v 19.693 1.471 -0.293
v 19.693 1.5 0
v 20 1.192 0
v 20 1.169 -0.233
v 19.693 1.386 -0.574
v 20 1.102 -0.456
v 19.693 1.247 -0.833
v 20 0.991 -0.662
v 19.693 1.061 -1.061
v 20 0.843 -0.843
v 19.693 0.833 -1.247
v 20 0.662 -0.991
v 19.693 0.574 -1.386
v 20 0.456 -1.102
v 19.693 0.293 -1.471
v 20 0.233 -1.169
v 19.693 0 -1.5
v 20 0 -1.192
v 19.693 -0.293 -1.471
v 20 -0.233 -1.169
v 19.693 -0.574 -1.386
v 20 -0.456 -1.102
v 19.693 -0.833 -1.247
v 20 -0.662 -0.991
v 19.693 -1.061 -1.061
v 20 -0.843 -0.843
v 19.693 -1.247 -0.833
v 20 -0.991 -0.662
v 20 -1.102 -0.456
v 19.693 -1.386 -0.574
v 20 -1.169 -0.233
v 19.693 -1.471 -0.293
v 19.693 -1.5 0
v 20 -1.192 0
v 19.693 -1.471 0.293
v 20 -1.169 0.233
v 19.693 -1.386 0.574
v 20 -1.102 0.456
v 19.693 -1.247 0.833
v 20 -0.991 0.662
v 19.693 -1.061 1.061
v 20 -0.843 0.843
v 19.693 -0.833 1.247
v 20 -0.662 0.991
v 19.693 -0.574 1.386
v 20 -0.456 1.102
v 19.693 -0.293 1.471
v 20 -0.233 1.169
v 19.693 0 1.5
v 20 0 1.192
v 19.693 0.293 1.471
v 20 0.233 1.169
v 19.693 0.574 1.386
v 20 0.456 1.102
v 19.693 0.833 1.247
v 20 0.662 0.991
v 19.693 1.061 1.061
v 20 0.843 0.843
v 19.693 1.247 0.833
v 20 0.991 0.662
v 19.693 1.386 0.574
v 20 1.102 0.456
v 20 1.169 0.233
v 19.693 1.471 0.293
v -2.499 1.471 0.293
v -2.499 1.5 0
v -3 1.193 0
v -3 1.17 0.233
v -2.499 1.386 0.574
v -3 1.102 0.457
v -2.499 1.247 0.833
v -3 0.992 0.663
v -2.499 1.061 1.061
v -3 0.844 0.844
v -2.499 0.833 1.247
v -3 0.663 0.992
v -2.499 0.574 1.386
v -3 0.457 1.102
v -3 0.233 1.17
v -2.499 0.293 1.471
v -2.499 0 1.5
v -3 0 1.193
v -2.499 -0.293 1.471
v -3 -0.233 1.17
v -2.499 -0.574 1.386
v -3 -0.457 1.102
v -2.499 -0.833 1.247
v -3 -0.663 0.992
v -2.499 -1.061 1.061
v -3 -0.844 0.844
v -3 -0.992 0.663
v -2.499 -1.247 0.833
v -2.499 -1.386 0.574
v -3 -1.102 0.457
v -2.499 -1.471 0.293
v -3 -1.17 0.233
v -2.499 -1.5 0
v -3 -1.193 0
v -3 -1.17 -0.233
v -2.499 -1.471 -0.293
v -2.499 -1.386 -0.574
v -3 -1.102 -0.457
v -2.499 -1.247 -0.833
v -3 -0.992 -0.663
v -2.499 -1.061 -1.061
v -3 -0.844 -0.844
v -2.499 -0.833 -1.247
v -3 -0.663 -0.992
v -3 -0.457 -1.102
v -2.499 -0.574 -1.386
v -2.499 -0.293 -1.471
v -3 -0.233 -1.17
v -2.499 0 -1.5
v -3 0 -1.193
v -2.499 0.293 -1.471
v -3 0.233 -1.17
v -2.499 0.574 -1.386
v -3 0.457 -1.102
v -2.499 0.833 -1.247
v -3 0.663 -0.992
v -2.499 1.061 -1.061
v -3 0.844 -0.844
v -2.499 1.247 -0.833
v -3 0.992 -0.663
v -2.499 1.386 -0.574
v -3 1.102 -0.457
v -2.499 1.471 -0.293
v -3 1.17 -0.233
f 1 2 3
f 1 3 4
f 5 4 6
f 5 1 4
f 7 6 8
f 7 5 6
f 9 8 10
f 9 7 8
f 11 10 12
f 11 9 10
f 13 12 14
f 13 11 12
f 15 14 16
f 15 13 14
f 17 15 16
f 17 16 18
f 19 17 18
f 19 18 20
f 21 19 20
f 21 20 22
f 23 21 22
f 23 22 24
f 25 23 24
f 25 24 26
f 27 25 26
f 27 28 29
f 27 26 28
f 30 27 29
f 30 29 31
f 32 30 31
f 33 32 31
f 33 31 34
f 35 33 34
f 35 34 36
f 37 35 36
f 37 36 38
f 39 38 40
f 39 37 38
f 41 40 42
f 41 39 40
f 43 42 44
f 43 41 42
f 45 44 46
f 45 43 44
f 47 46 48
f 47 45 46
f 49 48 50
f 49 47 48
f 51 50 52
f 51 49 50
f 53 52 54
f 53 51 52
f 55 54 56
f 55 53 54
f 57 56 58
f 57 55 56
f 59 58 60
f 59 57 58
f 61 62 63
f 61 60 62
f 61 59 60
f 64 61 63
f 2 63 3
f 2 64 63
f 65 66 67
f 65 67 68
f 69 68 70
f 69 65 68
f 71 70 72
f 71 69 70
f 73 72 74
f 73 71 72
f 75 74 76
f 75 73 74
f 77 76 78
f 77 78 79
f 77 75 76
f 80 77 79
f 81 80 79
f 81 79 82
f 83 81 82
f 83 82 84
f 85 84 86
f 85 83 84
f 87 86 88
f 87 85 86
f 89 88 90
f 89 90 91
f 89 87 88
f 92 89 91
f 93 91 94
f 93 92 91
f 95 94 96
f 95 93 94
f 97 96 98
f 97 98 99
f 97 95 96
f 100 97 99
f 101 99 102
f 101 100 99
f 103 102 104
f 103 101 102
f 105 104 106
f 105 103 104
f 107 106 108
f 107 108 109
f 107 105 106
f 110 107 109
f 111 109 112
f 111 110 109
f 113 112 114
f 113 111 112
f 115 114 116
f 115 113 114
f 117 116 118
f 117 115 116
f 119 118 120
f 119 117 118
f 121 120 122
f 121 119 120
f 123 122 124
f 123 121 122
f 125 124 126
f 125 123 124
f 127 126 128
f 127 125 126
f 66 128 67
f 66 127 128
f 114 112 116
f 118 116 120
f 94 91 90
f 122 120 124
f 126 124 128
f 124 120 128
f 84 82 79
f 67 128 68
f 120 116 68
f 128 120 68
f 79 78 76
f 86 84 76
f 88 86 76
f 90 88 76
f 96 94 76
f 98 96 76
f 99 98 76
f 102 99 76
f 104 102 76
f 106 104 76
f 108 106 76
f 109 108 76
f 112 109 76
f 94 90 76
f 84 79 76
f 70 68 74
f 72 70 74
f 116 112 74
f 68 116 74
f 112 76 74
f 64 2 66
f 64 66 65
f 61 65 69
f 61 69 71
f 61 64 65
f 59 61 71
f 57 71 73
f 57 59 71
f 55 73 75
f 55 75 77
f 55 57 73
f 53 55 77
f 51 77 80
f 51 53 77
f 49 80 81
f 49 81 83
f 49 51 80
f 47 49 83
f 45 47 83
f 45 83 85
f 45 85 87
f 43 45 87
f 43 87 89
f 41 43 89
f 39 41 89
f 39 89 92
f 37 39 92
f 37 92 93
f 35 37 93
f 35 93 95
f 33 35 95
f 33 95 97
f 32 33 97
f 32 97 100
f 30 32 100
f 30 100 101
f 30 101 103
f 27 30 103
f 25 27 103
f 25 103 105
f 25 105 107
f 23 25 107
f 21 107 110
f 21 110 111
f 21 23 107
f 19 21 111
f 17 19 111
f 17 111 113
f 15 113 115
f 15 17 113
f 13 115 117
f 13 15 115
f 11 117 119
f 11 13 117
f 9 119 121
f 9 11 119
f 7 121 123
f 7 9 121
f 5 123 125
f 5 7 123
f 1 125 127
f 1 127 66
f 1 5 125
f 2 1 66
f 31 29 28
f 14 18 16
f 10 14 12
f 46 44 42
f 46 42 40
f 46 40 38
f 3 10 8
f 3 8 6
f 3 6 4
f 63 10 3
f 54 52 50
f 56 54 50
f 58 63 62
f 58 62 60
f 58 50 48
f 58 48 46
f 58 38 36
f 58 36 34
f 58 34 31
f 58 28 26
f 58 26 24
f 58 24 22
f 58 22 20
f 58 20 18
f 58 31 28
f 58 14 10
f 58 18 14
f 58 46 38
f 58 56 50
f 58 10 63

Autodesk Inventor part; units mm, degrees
ref_plane "YZ Plane" through (0, 0, 0) normal (1, 0, 0) x (0, 1, 0)
ref_plane "XZ Plane" through (0, 0, 0) normal (0, 1, 0) x (-1, 0, 0)
sketch "Sketch1" plane through (0, 0, 0) normal (0, 0, 1) x (1, 0, 0)
  line L0 (20, 1.5) -> (20, 0)
  line L1 (-3, 0) -> (20, 0)
  line L2 (-7.6, 0) -> (24.6, 0) projected
  line L3 (0, 1.8) -> (0, -0.3) projected
  line L4 (-3, 1.5) -> (-3, 0)
  line L5 (8, 1.5) -> (8, 0) construction
  line L6 (-7.6, 0) -> (24.6, 0) projected
  line L7 (-3, 1.5) -> (20, 1.5)
  dimension "d4" = 3
  dimension "d5" = 20
  dimension "d6" = 12
  dimension "d13" = 3
revolve "Body" add sketch "Sketch1" angle 360 about axis through (-3, 0, 0) along (1, 0, 0)
thread "Thread1" size "M3x0.5" class "6g" standard "ISO Metric profile" length 3
thread "Thread2" size "M3x0.5" class "6g" standard "ISO Metric profile" length 12.3067
chamfer "Chamfer1" distance 0.3077 distance2 0.3067 1 edges at (20, -1.5, 0) measured on face at (20, -0.7567, -0.3972)
chamfer "Chamfer2" distance 0.501 distance2 0.3067 1 edges at (-3, -1.5, 0) measured on face at (12.1288, 1.4951, -0.1207)
ref_plane "Work Plane1" through (2.75, 0, 0) normal (0, -1, 0) x (1, 0, 0)
equation "\"d4\" = KOH"
equation "\"d5\" = NLG"
equation "\"d6\" = GEL"
equation "\"d13\" = GD"
equation "\"d1\" = KOH"
equation "\"d7\" = GEL + GAL"
equation "\"d10\" = -0.5 * SPD + 0.5 * GD"
equation "\"d12\" = -0.5 * SPD + 0.5 * GD"
equation "\"NLG\" = 20"
equation "\"GEL\" = 12"
equation "\"GAL\" = 0.61345 * PTC"
equation "\"SPD\" = NND - 1.2269 * PTC"
equation "\"d0\" = GD"
equation "\"GUL\" = 0.61345 * PTC"
equation "\"KOH\" = NND"
equation "\"GD\" = NND"
equation "\"BDM\" = NND"
equation "\"GUL1\" = 0.5"
equation "\"GAL1\" = 0.5"
equation "\"d80\" = -GUL - GEL"
equation "\"d86\" = -KOH + GUL1"
equation "\"PTC\" = 0.5"
equation "\"THREADDIA\" = 3"
equation "\"TOA\" = 30deg"
equation "\"NND\" = 3"
equation "\"GD1\" = THREADDIA - 1.2269 * PTC"
properties part number "CSN 02 1174 - A M3 x 20" material "Steel, Mild"
